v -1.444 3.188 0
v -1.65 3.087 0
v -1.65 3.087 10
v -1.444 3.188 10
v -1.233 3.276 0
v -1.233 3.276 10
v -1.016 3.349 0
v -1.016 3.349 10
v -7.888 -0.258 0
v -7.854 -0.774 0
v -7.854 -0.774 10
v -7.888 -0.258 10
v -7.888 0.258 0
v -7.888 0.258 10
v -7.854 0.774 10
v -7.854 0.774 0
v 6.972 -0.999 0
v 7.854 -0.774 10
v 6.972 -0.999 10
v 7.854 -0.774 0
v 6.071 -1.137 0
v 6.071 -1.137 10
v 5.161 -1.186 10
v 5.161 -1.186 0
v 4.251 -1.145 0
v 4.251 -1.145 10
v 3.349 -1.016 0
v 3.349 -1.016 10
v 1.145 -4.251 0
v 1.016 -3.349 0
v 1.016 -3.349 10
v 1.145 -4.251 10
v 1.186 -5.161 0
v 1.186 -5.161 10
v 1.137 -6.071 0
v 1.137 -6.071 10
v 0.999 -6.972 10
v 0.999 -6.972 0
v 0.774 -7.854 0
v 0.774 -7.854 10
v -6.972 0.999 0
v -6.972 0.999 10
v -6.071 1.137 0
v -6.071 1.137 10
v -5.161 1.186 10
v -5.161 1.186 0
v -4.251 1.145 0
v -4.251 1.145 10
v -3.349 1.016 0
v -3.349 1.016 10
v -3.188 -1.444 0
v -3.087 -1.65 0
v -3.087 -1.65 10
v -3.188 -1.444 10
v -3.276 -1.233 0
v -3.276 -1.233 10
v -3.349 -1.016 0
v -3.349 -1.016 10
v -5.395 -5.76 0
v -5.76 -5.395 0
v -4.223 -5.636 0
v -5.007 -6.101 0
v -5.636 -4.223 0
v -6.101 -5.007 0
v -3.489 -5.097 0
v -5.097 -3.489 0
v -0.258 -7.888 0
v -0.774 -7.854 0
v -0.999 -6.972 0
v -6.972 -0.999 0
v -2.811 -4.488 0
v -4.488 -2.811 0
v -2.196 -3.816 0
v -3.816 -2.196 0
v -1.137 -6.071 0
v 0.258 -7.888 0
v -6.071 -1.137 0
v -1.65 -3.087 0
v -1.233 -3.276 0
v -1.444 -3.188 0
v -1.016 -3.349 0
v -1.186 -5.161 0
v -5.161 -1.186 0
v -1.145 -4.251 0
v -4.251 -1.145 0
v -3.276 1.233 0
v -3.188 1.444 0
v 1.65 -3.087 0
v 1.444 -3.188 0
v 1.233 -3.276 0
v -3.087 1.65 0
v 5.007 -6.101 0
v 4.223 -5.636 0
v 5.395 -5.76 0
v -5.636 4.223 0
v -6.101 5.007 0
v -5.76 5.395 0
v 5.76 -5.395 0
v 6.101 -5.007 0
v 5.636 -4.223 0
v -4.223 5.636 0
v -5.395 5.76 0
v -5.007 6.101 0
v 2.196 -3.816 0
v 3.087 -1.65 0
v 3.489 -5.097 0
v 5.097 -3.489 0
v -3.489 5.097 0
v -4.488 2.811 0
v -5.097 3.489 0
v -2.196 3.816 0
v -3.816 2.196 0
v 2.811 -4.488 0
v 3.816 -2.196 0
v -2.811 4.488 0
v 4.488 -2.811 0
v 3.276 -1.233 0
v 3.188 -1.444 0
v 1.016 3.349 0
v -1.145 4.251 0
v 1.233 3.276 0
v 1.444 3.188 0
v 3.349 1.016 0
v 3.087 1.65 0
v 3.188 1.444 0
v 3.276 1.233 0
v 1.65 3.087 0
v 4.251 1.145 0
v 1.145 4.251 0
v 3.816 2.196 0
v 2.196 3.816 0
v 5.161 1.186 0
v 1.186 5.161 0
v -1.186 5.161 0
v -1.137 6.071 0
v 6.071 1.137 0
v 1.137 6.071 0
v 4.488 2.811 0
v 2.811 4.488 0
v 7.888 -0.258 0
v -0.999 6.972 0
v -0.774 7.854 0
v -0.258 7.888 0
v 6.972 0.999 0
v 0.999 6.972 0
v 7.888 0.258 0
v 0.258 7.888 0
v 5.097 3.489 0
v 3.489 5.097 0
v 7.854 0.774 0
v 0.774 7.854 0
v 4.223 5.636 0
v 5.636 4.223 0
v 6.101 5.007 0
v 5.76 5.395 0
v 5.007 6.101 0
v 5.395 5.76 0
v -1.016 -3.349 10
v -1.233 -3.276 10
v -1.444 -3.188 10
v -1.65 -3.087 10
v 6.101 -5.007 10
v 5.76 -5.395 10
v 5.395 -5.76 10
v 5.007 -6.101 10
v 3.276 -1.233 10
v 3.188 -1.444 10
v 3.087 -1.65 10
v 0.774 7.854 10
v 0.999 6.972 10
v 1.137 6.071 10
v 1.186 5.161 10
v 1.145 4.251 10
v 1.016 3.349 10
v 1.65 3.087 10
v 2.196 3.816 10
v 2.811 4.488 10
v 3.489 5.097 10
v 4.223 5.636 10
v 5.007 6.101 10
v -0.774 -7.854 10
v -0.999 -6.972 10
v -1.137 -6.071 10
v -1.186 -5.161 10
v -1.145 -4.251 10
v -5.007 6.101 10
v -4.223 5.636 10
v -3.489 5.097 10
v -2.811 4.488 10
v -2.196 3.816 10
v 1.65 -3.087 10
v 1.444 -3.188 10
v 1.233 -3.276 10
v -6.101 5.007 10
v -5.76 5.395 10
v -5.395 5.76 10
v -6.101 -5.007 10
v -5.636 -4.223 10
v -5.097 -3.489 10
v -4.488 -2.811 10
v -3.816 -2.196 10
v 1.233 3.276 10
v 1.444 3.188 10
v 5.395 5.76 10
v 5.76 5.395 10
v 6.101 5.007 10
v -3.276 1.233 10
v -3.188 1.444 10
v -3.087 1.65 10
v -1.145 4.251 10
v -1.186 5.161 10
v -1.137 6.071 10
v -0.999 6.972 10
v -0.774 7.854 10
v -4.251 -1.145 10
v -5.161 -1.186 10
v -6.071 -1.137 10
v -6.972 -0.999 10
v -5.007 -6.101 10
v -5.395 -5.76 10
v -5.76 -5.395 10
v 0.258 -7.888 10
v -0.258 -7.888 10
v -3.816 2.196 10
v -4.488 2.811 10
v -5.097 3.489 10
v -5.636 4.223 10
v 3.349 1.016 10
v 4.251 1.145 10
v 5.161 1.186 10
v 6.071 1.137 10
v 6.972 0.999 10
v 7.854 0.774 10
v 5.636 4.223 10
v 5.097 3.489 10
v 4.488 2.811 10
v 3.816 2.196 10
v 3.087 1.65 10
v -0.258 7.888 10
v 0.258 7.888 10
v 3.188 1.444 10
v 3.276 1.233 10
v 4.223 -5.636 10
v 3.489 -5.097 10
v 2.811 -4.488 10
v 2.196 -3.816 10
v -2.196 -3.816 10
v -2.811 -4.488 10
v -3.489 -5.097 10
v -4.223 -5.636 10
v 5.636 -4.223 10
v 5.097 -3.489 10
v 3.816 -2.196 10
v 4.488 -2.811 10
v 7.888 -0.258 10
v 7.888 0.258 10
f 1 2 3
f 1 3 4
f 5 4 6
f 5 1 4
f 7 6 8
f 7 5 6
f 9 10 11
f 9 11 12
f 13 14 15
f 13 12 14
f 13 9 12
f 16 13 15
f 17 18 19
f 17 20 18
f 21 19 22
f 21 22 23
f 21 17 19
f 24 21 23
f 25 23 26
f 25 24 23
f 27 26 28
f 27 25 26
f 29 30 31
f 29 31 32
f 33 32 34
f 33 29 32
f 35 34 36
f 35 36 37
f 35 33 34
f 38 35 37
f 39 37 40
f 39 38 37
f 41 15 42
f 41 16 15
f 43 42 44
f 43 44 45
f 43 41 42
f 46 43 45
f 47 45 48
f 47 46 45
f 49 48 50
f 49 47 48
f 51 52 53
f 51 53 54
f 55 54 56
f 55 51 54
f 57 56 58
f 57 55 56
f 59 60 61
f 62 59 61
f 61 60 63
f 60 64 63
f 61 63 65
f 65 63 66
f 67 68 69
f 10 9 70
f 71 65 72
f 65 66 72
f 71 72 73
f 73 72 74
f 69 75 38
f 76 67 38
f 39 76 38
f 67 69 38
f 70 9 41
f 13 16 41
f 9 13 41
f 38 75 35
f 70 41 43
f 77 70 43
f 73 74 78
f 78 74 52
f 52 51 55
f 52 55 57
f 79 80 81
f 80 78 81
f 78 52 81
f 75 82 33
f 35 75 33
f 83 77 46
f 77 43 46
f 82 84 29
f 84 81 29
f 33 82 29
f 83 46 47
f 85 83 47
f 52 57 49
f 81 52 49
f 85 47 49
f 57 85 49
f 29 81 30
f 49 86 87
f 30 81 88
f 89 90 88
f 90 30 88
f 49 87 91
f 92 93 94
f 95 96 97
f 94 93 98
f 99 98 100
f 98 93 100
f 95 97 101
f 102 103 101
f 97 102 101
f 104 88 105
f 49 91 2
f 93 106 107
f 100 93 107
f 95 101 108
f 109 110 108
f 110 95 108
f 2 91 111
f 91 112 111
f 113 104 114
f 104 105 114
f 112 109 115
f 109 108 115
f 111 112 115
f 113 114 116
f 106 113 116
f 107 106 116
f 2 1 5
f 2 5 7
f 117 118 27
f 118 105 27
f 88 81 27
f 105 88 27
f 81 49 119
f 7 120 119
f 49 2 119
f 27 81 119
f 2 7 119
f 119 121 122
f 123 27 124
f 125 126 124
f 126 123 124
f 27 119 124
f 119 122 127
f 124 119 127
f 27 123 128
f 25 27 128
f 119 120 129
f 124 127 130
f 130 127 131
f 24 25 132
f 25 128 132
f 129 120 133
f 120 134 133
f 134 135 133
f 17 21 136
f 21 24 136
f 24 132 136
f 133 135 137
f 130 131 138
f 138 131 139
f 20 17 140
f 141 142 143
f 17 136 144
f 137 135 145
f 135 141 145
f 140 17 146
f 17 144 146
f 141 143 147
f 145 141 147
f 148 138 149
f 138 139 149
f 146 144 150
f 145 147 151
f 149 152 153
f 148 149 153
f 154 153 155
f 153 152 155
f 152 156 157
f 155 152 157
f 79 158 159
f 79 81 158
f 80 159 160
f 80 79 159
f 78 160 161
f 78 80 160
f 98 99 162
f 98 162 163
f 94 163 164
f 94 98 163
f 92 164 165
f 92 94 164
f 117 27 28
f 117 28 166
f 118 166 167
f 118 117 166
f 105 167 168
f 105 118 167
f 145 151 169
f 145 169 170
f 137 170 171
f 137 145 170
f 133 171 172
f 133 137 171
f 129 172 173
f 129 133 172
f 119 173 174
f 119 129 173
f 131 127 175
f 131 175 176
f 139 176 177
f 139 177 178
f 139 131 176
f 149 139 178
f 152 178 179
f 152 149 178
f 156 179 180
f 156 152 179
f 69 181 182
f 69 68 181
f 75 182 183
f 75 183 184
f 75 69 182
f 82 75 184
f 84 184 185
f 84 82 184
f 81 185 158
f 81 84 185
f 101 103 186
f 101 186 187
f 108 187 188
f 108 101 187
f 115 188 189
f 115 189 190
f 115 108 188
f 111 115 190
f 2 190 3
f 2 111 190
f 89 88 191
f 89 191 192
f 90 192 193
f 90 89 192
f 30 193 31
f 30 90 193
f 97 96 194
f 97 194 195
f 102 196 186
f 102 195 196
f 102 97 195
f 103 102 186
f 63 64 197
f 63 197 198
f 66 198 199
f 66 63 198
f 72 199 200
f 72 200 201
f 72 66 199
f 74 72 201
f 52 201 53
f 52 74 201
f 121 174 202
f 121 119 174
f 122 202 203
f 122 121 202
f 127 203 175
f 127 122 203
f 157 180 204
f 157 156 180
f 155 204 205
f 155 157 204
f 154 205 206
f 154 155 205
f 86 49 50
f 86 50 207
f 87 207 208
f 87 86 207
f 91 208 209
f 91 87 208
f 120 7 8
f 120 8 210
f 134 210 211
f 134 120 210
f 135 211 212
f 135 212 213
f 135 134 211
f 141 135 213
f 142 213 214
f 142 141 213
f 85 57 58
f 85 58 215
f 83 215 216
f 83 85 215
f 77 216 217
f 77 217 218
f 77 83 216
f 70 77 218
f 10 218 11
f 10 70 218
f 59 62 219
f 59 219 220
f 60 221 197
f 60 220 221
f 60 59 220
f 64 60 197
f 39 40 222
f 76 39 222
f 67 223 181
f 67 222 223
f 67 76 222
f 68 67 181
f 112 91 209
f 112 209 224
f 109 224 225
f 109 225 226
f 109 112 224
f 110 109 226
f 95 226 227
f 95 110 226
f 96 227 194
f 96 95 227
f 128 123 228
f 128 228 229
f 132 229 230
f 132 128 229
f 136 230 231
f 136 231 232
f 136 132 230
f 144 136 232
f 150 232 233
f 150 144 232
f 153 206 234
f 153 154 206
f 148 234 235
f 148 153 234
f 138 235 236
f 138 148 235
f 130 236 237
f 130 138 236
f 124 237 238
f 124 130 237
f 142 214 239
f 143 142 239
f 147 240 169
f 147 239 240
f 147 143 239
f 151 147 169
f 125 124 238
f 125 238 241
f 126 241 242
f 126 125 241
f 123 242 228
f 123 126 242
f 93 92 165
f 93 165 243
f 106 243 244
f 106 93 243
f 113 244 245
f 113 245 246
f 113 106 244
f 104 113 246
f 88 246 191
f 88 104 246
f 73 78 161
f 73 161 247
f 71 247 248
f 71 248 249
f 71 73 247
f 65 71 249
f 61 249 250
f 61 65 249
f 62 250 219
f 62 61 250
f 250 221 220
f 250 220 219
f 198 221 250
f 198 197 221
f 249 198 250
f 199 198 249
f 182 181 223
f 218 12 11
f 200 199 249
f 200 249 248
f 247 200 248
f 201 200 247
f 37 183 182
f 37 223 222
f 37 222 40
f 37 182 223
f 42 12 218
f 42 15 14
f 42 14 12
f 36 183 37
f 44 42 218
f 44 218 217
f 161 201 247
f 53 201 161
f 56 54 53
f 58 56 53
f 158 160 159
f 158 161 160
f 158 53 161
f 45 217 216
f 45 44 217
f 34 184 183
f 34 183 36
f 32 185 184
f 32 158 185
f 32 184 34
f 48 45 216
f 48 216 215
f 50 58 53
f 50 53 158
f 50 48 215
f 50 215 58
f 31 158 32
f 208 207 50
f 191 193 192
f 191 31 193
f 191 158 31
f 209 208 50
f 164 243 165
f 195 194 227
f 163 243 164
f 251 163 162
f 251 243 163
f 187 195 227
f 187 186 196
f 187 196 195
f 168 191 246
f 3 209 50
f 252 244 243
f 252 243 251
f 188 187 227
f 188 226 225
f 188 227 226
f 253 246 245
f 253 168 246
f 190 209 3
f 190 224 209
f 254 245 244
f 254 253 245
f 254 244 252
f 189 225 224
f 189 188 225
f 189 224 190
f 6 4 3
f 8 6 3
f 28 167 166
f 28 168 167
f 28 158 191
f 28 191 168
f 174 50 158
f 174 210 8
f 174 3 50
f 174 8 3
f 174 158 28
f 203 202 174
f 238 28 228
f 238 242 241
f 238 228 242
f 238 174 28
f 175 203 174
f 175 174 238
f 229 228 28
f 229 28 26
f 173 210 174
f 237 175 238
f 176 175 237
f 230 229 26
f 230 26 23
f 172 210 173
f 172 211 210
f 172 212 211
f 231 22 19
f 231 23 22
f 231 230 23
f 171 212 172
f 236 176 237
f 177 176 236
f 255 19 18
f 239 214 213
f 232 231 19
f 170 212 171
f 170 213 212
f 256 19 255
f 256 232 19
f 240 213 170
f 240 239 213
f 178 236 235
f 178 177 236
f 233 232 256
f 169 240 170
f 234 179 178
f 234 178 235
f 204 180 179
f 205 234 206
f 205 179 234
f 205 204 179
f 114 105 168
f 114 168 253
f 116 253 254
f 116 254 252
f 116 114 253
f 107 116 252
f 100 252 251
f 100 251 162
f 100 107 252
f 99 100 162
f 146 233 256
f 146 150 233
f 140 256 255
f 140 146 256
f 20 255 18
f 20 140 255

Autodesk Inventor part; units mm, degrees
sketch "Sketch1" plane through (0, 0, 0) normal (0, 0, 1) x (1, 0, 0)
  circle A0 centre (0, 0) radius 7.8925
  dimension "d0" = 15.785
extrude "Extrusion1" add sketch "Sketch1" along normal blind 10
ref_plane "Work Plane2" through (0, 0, 5) normal (0, 0, 1) x (1, 0, 0)
sketch "Sketch2" plane through (0, 0, 0) normal (0, 0, -1) x (-1, 0, 0)
  circle A0 centre (0, 0) radius 7.8925 projected
  circle A1 centre (0, 0) radius 6
  dimension "d3" = 12
surface extrude "Pitch Diameter" sketch "Sketch2" against normal through all shown no curves A1
ref_plane "Work Plane8" through (0, 0, 0) normal (0.9238795, 0.3826834, 0) x (0, 0, 1)
ref_plane "Work Plane9" through (0, 0, 0) normal (1, 0, 0) x (0, 1, 0)
spur gear teeth "Spur Gear" teeth 8 pitch diameter 12 tip diameter 15.785 root diameter 7 face width 10 start plane through (0, 0, 0) normal (0, 0, -1) x (-1, 0, 0)
equation "\"d0\" = da_da"
equation "\"d1\" = da_b"
equation "\"d3\" = da_d"
equation "\"da_da\" = 15.785039"
equation "\"da_b\" = 10"
equation "\"da_d\" = 12"
properties part number "Spur Gear1" material "Steel"
